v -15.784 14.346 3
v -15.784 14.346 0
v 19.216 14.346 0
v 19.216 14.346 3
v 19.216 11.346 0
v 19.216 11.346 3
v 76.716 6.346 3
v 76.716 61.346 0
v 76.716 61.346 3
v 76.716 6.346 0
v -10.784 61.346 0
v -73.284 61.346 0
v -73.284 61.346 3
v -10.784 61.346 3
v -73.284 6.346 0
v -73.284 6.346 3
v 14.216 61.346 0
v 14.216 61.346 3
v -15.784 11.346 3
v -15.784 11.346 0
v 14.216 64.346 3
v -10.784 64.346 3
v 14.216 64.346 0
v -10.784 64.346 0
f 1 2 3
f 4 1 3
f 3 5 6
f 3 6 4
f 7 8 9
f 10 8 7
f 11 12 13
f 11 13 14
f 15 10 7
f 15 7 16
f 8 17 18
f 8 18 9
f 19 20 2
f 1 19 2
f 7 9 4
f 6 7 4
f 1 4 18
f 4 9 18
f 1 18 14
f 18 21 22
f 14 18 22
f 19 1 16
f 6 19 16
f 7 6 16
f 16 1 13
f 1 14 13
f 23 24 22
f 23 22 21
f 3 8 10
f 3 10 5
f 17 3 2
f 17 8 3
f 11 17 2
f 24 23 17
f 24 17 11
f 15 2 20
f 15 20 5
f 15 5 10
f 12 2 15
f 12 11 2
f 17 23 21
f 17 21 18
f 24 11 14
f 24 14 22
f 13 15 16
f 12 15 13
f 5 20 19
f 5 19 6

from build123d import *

# Parameters (mm, degrees)
SKETCH_1_W      = 35
SKETCH_1_H      = 3
EXTRUDE_1_DEPTH = 3


with BuildPart() as part:
    # Эскиз1 → Бобышка-Вытянуть1 (new body)
    with BuildSketch(Plane.XY):
        Polygon((14.215686275, 61.346405229), (76.715686275, 61.346405229), (76.715686275, 6.346405229), (-73.284313725, 6.346405229), (-73.284313725, 61.346405229), (-10.784313725, 61.346405229), (-10.784313725, 64.346405229), (14.215686275, 64.346405229), align=None)
        with Locations((1.715686275, 12.846405229)):
            Rectangle(SKETCH_1_W, SKETCH_1_H, mode=Mode.SUBTRACT)
    extrude(amount=EXTRUDE_1_DEPTH)


solid = part.part
